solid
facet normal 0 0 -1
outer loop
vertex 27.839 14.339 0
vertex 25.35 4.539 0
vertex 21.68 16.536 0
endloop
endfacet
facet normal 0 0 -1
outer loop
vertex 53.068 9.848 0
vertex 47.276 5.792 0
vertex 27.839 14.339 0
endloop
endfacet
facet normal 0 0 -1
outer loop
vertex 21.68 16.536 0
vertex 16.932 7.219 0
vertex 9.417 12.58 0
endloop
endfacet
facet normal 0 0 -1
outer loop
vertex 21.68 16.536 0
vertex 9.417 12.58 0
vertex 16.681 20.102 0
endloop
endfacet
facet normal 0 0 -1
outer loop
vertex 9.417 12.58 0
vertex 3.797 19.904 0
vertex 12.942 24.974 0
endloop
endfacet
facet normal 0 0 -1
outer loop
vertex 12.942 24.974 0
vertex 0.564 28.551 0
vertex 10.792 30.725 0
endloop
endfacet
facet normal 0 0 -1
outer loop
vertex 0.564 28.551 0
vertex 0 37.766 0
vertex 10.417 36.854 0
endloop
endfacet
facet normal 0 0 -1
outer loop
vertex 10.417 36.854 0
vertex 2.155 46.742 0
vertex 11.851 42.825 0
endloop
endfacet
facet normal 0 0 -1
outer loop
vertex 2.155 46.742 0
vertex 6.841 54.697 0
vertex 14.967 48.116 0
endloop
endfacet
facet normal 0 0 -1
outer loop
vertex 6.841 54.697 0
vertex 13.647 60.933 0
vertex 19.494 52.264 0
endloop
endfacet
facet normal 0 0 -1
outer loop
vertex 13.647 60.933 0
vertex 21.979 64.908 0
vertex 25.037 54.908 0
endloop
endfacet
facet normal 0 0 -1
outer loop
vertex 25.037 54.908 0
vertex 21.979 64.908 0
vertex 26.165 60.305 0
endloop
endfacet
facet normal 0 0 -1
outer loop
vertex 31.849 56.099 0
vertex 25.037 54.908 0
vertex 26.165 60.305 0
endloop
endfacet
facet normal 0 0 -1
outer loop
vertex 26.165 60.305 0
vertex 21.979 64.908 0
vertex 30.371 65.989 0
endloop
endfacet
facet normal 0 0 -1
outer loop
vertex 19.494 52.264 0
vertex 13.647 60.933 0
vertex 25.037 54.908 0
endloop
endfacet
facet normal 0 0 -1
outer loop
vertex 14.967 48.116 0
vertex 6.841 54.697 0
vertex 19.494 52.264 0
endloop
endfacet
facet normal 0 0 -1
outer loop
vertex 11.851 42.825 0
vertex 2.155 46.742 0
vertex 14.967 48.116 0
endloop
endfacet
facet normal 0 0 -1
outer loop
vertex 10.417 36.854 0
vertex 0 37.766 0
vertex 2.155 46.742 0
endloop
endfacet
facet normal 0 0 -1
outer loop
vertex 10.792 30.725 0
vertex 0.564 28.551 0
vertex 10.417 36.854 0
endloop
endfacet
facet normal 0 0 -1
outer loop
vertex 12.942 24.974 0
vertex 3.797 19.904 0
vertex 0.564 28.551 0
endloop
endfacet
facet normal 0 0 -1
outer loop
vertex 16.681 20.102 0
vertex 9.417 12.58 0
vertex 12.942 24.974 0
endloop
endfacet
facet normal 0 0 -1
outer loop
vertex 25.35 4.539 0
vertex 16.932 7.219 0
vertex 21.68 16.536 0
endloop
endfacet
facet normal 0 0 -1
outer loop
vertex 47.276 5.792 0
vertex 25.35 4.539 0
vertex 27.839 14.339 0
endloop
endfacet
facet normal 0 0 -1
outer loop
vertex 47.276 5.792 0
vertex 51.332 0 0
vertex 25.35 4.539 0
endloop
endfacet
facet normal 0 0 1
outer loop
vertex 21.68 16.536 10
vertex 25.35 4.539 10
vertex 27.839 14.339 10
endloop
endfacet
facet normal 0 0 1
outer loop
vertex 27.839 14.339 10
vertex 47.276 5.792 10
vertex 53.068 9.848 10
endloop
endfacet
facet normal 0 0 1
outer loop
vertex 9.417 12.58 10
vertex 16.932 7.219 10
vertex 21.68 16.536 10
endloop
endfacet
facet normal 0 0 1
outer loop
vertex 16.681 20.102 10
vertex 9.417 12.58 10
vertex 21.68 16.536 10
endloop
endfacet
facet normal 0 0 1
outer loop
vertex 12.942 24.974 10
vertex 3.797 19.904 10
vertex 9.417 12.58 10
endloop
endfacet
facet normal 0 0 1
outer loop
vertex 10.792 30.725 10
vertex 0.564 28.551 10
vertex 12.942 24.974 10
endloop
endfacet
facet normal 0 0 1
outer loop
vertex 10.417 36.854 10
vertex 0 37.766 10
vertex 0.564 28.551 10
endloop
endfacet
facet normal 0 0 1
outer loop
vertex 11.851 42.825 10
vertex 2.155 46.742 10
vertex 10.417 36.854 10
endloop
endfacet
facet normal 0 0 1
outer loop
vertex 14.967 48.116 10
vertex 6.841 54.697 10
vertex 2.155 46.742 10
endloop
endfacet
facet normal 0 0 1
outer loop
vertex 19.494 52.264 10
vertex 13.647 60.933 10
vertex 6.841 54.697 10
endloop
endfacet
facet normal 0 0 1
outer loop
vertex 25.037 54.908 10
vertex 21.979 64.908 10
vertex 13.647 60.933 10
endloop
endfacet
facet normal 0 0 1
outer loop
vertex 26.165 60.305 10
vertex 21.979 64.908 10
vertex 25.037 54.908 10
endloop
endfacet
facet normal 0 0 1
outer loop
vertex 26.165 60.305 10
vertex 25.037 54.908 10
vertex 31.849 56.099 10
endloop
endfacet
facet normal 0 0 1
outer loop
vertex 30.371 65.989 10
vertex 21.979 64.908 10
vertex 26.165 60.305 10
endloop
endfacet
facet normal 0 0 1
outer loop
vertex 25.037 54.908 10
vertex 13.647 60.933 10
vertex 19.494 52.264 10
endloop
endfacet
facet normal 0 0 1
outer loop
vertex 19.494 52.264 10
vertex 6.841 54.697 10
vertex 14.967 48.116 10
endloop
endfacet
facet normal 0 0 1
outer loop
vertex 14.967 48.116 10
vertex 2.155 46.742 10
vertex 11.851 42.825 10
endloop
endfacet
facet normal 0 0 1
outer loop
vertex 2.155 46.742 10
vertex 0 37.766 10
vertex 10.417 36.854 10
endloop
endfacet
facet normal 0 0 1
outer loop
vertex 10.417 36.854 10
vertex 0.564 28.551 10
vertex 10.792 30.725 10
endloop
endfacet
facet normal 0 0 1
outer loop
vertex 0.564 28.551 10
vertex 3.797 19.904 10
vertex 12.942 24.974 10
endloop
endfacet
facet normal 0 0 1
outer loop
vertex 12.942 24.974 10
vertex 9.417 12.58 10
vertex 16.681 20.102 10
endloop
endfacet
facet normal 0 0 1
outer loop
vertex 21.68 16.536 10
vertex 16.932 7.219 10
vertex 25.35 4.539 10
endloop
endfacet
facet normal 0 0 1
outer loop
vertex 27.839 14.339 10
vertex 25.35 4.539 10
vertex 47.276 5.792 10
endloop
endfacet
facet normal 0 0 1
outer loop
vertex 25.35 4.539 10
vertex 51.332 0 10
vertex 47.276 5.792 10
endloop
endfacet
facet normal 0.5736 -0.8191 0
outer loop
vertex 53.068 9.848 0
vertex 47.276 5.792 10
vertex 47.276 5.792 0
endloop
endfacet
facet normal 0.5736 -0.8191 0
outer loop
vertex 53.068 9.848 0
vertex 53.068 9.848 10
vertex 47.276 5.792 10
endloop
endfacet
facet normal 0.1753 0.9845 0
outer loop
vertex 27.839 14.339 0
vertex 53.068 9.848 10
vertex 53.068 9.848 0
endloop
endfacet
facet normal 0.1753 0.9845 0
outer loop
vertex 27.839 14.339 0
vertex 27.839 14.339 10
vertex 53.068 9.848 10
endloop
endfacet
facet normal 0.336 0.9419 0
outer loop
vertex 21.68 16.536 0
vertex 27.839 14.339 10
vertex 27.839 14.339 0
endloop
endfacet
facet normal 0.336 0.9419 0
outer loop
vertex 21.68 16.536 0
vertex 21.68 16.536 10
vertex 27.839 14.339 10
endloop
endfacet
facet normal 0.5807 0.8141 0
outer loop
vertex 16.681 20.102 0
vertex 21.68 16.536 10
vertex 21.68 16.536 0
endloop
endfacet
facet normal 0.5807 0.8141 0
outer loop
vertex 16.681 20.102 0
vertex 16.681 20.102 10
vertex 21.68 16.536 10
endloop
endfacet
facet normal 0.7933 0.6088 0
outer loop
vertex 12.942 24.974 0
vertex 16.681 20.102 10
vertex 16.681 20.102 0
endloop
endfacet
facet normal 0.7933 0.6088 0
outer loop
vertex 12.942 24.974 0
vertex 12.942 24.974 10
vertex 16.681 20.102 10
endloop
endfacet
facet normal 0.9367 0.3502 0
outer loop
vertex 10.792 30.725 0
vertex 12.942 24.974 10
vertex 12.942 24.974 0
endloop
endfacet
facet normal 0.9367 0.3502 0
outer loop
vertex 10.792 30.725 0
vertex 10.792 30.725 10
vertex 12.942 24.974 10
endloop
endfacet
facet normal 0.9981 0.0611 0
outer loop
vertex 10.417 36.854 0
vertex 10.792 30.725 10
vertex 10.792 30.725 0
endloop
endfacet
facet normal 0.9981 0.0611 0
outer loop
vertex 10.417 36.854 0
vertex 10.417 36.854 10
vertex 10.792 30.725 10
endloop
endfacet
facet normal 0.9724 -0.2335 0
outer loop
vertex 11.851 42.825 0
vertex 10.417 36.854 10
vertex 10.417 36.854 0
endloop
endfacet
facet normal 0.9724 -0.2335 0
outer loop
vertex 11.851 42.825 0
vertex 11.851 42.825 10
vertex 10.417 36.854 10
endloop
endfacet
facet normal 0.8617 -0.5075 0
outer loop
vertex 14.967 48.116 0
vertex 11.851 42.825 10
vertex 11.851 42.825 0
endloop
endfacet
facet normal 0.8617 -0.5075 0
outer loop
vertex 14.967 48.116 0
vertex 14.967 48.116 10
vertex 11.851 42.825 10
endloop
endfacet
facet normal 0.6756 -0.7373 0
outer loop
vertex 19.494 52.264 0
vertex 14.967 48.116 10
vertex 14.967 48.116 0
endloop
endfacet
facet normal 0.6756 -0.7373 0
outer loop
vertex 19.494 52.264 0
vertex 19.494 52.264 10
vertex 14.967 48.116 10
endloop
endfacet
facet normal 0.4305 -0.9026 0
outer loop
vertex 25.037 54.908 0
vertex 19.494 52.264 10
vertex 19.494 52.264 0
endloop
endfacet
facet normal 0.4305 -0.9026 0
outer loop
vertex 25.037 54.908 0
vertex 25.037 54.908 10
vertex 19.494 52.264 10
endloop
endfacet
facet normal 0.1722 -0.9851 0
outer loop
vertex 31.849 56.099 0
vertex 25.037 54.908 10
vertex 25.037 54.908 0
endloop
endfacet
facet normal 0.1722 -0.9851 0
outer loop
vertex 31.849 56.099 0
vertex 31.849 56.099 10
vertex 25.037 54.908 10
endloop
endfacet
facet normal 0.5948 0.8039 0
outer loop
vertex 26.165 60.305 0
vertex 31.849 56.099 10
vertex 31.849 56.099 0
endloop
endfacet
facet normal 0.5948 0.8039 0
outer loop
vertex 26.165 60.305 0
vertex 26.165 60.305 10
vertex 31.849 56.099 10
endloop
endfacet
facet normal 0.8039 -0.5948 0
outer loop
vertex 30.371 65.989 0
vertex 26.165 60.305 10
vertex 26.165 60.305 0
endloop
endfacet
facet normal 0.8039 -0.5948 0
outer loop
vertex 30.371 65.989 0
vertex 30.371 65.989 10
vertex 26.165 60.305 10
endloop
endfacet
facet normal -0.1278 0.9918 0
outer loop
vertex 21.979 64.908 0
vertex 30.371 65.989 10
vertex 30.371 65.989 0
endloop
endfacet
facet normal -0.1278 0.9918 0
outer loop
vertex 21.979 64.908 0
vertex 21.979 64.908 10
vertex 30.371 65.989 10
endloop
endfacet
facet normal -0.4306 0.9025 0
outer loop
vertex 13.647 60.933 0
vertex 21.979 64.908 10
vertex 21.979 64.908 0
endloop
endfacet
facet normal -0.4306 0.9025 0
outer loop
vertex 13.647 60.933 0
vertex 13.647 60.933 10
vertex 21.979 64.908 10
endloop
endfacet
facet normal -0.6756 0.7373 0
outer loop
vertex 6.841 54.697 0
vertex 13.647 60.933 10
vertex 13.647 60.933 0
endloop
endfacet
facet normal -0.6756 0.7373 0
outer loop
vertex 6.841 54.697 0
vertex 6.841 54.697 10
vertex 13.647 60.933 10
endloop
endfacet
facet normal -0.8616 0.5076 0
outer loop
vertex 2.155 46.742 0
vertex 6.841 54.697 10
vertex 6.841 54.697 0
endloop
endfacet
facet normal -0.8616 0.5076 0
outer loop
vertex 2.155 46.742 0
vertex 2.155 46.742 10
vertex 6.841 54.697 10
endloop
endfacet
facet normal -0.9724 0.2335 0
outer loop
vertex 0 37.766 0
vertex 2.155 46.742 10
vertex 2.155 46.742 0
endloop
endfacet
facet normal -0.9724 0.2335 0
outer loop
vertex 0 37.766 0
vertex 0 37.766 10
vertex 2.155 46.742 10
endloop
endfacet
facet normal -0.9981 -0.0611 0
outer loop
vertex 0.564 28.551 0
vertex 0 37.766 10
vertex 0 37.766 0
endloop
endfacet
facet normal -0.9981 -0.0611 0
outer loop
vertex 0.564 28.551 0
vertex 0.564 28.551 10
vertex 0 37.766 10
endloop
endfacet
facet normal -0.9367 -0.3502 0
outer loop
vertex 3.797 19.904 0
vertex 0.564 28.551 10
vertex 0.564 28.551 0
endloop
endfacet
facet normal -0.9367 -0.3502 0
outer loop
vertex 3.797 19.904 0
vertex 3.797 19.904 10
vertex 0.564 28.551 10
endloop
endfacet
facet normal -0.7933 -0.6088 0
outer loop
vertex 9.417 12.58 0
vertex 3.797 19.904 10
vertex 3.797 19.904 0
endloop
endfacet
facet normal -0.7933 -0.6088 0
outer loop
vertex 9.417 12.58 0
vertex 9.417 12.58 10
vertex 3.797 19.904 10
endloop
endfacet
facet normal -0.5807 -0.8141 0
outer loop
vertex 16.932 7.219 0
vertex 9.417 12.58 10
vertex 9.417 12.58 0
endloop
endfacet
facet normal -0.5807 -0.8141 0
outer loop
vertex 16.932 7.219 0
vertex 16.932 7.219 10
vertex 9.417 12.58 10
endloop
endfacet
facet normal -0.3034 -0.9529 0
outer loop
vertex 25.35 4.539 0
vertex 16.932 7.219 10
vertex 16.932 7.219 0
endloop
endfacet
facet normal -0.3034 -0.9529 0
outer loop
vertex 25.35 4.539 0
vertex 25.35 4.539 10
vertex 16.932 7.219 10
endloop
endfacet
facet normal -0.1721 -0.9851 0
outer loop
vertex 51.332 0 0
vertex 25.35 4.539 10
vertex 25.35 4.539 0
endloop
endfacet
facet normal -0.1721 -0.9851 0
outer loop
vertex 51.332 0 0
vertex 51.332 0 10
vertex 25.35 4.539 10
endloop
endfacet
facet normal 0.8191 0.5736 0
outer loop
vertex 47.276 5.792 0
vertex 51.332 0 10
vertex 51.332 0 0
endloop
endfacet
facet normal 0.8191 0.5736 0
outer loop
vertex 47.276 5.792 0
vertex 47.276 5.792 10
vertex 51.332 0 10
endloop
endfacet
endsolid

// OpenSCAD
$fn = 32;
// ----------------------------------------------------------------------
// Hook plate: curl radius 26 mm over 170 degrees, 10 mm thick band
// ----------------------------------------------------------------------

// --- parameters (mm) ---
profile_height = 10;      // extrusion height
profile_points = 26;      // points of the closed outline

profile = [[26.165, 60.305], [30.371, 65.989], [21.979, 64.908], [13.647, 60.933], [6.841, 54.697], [2.155, 46.742], [0, 37.766], [0.564, 28.551], [3.797, 19.904], [9.417, 12.58], [16.932, 7.219], [25.35, 4.539], [51.332, 0], [47.276, 5.792], [53.068, 9.848], [27.839, 14.339], [21.68, 16.536], [16.681, 20.102], [12.942, 24.974], [10.792, 30.725], [10.417, 36.854], [11.851, 42.825], [14.967, 48.116], [19.494, 52.264], [25.037, 54.908], [31.849, 56.099]];  // single closed polygon, 26 points, counter clockwise

// --- the one profile operation ---
linear_extrude(height = profile_height) polygon(points = profile);
